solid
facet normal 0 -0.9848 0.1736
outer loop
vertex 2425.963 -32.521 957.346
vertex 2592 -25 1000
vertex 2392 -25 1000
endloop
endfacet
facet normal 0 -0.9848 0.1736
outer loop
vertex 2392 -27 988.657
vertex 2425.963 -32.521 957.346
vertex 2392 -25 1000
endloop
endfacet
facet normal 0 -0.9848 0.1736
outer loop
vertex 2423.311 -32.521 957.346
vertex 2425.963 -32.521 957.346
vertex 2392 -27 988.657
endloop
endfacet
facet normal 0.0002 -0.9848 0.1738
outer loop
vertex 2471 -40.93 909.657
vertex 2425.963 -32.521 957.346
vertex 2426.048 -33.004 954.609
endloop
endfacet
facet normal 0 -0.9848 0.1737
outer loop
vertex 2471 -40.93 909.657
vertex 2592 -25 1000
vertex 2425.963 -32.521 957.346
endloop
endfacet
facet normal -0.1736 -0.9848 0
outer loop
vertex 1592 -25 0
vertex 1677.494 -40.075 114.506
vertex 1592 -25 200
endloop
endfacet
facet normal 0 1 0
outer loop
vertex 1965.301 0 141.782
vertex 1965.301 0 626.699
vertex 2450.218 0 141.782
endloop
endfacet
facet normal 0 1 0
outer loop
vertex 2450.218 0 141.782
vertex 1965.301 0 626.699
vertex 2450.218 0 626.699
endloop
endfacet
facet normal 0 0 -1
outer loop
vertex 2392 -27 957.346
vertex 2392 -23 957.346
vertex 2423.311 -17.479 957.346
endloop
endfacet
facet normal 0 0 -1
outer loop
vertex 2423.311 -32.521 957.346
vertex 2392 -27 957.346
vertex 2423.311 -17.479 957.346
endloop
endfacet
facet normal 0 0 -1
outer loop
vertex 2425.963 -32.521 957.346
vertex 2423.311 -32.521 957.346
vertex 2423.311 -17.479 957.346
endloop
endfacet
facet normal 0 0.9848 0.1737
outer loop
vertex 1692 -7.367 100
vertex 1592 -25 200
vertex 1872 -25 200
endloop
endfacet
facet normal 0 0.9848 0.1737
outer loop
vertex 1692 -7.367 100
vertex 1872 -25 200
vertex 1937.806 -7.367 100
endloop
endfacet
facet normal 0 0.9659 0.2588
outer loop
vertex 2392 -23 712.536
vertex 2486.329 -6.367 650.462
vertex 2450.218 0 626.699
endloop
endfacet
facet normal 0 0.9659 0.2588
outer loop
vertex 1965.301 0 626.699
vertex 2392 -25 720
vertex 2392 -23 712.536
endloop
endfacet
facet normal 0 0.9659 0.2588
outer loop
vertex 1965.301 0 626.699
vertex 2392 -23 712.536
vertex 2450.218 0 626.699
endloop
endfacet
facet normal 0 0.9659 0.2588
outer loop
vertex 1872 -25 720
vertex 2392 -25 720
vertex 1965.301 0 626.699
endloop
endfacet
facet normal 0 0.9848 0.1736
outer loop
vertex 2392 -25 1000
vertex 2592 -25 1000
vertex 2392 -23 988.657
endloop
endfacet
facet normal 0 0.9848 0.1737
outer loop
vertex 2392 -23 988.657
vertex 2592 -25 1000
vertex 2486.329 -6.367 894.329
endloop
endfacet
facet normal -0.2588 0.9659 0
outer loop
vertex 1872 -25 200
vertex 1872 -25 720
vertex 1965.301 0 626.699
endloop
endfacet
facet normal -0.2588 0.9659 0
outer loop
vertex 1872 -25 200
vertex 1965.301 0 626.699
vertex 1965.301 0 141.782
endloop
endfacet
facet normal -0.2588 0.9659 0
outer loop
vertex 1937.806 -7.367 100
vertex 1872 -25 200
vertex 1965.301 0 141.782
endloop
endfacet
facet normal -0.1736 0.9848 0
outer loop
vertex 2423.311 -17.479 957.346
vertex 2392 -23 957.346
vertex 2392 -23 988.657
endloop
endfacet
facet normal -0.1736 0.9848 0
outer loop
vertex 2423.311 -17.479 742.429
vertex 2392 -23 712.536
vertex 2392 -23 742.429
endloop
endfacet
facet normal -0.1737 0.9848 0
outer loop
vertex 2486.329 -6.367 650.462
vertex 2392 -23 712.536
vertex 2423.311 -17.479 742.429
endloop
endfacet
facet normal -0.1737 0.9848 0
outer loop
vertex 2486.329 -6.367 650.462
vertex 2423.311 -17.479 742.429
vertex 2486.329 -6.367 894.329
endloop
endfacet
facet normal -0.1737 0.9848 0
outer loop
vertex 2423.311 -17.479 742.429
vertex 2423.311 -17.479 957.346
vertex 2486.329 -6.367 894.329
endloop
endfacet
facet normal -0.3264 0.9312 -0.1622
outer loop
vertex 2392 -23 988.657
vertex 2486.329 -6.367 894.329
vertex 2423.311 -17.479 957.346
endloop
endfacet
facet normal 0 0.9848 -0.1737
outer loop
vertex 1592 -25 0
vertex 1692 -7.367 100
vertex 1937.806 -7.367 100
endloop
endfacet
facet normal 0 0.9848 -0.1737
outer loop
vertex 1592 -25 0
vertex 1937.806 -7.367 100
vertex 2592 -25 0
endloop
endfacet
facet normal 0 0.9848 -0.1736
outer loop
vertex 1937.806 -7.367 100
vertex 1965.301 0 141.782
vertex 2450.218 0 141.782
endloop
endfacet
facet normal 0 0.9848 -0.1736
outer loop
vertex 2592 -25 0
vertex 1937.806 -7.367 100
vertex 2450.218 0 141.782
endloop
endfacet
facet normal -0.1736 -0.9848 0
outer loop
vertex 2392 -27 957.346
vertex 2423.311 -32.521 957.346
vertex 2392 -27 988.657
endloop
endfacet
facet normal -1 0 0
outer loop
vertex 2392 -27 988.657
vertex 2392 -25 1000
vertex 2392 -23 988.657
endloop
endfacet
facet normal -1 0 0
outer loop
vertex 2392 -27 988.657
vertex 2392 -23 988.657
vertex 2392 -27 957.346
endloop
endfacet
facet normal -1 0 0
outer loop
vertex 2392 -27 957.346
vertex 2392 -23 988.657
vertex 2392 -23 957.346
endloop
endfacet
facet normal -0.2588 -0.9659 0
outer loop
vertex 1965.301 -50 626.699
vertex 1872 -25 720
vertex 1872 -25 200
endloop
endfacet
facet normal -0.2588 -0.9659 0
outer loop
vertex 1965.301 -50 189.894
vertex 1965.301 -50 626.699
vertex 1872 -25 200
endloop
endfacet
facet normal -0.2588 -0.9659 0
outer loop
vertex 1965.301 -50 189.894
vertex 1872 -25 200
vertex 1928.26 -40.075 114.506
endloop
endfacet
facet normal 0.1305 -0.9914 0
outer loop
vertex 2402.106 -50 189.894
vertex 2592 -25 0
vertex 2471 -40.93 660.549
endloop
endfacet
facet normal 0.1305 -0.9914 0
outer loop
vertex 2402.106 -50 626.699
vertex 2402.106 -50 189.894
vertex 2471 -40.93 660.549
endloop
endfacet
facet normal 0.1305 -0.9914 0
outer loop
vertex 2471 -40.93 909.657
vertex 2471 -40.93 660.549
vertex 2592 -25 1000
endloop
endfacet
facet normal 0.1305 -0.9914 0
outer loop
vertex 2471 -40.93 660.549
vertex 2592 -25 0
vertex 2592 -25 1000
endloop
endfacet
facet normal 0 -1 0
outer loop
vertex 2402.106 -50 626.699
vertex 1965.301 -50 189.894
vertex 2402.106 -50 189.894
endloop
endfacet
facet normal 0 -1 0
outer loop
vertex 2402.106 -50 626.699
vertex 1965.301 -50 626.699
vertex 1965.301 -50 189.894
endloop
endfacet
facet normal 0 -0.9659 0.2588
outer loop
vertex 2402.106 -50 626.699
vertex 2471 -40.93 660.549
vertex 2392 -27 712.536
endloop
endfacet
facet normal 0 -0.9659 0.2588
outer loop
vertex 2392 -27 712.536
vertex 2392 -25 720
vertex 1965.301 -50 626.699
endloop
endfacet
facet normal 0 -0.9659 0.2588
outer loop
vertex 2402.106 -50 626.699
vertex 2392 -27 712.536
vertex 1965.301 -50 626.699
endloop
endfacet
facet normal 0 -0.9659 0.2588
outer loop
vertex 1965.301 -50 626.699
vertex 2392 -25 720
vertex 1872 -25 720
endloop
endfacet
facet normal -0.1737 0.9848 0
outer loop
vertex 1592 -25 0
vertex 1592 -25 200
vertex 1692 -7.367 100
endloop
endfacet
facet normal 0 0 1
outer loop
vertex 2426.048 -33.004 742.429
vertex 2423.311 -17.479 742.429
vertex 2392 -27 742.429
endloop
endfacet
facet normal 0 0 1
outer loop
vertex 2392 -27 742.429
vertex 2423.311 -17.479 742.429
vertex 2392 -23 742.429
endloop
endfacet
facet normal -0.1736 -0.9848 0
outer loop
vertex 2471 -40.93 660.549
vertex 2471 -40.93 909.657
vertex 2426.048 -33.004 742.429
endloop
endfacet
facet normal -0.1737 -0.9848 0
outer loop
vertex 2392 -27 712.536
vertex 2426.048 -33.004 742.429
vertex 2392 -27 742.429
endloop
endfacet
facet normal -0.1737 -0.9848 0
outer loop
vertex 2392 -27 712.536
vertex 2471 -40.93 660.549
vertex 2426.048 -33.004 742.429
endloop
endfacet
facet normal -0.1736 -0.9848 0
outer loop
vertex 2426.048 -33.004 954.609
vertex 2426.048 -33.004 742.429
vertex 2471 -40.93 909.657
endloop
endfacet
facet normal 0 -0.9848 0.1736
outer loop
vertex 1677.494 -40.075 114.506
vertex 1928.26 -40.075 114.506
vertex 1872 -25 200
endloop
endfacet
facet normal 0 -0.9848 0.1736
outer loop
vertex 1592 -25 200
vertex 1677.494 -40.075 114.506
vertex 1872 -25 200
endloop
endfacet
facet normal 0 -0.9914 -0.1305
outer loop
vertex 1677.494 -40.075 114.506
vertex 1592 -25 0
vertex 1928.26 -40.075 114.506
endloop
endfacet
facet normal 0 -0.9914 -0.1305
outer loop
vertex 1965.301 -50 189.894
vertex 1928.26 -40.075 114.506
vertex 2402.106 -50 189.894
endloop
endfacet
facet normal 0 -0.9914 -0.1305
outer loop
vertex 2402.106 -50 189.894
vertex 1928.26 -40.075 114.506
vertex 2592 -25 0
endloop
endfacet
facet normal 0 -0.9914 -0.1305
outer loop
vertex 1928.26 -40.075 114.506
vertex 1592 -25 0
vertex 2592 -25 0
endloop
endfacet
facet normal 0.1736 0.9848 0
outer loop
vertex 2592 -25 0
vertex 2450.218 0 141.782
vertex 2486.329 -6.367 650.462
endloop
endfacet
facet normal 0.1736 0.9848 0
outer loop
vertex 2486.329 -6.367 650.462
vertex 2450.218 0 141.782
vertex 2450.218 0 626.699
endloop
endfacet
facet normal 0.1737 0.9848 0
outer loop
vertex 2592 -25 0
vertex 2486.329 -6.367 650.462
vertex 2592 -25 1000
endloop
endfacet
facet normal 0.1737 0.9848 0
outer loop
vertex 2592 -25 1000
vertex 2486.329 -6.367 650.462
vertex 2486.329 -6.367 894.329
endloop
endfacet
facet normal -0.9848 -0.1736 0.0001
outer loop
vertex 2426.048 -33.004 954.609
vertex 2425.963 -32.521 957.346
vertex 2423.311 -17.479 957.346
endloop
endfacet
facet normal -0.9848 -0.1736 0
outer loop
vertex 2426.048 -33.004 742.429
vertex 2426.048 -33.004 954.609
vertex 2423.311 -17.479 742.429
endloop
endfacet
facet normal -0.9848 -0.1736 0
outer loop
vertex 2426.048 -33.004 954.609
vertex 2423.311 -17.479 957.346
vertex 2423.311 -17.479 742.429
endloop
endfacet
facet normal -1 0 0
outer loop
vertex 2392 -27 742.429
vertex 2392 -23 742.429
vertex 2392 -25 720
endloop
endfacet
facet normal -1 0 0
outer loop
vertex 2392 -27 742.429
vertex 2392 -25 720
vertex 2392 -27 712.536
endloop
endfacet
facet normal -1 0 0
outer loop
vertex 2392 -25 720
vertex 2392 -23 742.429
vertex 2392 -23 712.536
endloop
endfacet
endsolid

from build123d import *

# Parameters (mm, degrees)
F1_DEPTH    = 50
F3_SIZE2    = 141.7820454904
F3_SIZE     = 25
F4_SIZE2    = 24.99999
F4_SIZE     = 189.893843
F5_SIZE2    = 141.782035
F5_SIZE     = 24.99999
F5_2_SIZE2  = 141.782035
F5_2_SIZE   = 24.99999
F6_T1_DEPTH = 477.1700191754
F7_T1_DEPTH = 506.6441108429
F8_SIZE2    = 25
F8_SIZE     = 93.3012701892
F8_2_SIZE2  = 24.99999
F8_2_SIZE   = 93.30126
F10_DEPTH   = 25


# Not quite as in the source:
# - a fillet or chamfer that OpenCascade refuses, or shapes differently, is made with other operations: its cross-section is extruded or revolved along the edge and cut away or added
# - a fillet or chamfer is up to 0.001 mm smaller than in the source, because OpenCascade refuses the exact size


with BuildPart() as f1:
    # F0 (on Front) → F1 (new body)
    with BuildSketch(Plane.XZ):
        Polygon((0, 200), (0, 0), (1000, 0), (1000, 1000), (800, 1000), (800, 720), (280, 720), (280, 200), align=None)
    extrude(amount=F1_DEPTH)


with BuildPart() as f1_1:
    # F2: moved
    add(f1.part.moved(Location((1592, 0, 0))))

    # F3
    f3_edges = [f1_1.edges().sort_by_distance(p)[0] for p in [
        (2592, 0, 500),
        (2092, 0, 0),
    ]]
    chamfer(f3_edges, length=F3_SIZE, length2=F3_SIZE2)

    # F4 (size 189.8938528181 and 25 in the source; OpenCascade refuses exactly that, so slightly less here)
    f4_edges = [f1_1.edges().sort_by_distance(p)[0] for p in [
        (2092, -50, 0),
        (2592, -50, 500),
    ]]
    f4_side = f1_1.faces().sort_by_distance((2210.680203, -50, 381.319797))[0]
    chamfer(f4_edges, length=F4_SIZE, length2=F4_SIZE2, reference=f4_side)

    # F5 (size 25 and 141.7820454904 in the source; OpenCascade refuses exactly that, so slightly less here)
    f5_edges = [f1_1.edges().sort_by_distance(p)[0] for p in [
        (2421.108977, 0, 1000),
        (2397.053079, -50, 1000),
    ]]
    f5_side = f1_1.faces().sort_by_distance((2461.151755, -23.287804, 1000))[0]
    chamfer(f5_edges, length=F5_SIZE, length2=F5_SIZE2, reference=f5_side)

    # F5#2 (size 25 and 141.7820454904 in the source; OpenCascade refuses exactly that, so slightly less here)
    f5_2_edges = [f1_1.edges().sort_by_distance(p)[0] for p in [
        (1592, 0, 170.891023),
        (1592, -50, 194.946922),
    ]]
    f5_2_side = f1_1.faces().sort_by_distance((1592, -23.287804, 130.848245))[0]
    chamfer(f5_2_edges, length=F5_2_SIZE, length2=F5_2_SIZE2, reference=f5_2_side)

    # F6: chamfer of 23 x 130.4394818512 on 2 edges, made by hand

    # F6_s2 → F6_t1 (cut)
    with BuildSketch(Plane.XY.offset(720)):
        Polygon((2522.4394818512, -50), (2392, -27), (2392, -50), align=None)
        Polygon((2392, -23), (2522.4394818512, 0), (2392, 0), align=None)
    extrude(amount=F6_T1_DEPTH, mode=Mode.SUBTRACT)

    # F7: chamfer of 25 x 141.7820454904 on 2 edges, made by hand

    # F7_s2 → F7_t1 (cut)
    with BuildSketch(Plane.YZ.offset(1365.3558891571)):
        Polygon((-25, 200), (0, 58.2179545096), (0, 200), align=None)
        Polygon((-50, 58.2179545096), (-25, 200), (-50, 200), align=None)
    extrude(amount=F7_T1_DEPTH, mode=Mode.SUBTRACT)

    # F8
    f8_edges = [f1_1.edges().sort_by_distance(p)[0] for p in [
        (1872, 0, 430.891023),
        (2161.108977, 0, 720),
    ]]
    f8_side = f1_1.faces().sort_by_distance((2161.108977, 0, 430.891023))[0]
    chamfer(f8_edges, length=F8_SIZE, length2=F8_SIZE2, reference=f8_side)

    # F8#2 (size 93.3012701892 and 25 in the source; OpenCascade refuses exactly that, so slightly less here)
    f8_2_edges = [f1_1.edges().sort_by_distance(p)[0] for p in [
        (1872, -50, 454.946922),
        (2137.053079, -50, 720),
    ]]
    f8_2_side = f1_1.faces().sort_by_distance((2137.053079, -50, 454.946921))[0]
    chamfer(f8_2_edges, length=F8_2_SIZE, length2=F8_2_SIZE2, reference=f8_2_side)

    # F9 (on face) → F10 (cut)
    with BuildSketch(Plane(origin=(76.0608571883, -431.3625565565, 0), x_dir=(-0.984807753, -0.1736481777, 0), z_dir=(-0.1736481777, 0.984807753, 0))):
        Polygon((-2346.6920852661, 742.4287796021), (-2347.2633361816, 957.3464989662), (-2383.4601961924, 957.3464989662), (-2383.4601961924, 742.4287796021), align=None)
    extrude(amount=-F10_DEPTH, mode=Mode.SUBTRACT)


solid = f1_1.part
